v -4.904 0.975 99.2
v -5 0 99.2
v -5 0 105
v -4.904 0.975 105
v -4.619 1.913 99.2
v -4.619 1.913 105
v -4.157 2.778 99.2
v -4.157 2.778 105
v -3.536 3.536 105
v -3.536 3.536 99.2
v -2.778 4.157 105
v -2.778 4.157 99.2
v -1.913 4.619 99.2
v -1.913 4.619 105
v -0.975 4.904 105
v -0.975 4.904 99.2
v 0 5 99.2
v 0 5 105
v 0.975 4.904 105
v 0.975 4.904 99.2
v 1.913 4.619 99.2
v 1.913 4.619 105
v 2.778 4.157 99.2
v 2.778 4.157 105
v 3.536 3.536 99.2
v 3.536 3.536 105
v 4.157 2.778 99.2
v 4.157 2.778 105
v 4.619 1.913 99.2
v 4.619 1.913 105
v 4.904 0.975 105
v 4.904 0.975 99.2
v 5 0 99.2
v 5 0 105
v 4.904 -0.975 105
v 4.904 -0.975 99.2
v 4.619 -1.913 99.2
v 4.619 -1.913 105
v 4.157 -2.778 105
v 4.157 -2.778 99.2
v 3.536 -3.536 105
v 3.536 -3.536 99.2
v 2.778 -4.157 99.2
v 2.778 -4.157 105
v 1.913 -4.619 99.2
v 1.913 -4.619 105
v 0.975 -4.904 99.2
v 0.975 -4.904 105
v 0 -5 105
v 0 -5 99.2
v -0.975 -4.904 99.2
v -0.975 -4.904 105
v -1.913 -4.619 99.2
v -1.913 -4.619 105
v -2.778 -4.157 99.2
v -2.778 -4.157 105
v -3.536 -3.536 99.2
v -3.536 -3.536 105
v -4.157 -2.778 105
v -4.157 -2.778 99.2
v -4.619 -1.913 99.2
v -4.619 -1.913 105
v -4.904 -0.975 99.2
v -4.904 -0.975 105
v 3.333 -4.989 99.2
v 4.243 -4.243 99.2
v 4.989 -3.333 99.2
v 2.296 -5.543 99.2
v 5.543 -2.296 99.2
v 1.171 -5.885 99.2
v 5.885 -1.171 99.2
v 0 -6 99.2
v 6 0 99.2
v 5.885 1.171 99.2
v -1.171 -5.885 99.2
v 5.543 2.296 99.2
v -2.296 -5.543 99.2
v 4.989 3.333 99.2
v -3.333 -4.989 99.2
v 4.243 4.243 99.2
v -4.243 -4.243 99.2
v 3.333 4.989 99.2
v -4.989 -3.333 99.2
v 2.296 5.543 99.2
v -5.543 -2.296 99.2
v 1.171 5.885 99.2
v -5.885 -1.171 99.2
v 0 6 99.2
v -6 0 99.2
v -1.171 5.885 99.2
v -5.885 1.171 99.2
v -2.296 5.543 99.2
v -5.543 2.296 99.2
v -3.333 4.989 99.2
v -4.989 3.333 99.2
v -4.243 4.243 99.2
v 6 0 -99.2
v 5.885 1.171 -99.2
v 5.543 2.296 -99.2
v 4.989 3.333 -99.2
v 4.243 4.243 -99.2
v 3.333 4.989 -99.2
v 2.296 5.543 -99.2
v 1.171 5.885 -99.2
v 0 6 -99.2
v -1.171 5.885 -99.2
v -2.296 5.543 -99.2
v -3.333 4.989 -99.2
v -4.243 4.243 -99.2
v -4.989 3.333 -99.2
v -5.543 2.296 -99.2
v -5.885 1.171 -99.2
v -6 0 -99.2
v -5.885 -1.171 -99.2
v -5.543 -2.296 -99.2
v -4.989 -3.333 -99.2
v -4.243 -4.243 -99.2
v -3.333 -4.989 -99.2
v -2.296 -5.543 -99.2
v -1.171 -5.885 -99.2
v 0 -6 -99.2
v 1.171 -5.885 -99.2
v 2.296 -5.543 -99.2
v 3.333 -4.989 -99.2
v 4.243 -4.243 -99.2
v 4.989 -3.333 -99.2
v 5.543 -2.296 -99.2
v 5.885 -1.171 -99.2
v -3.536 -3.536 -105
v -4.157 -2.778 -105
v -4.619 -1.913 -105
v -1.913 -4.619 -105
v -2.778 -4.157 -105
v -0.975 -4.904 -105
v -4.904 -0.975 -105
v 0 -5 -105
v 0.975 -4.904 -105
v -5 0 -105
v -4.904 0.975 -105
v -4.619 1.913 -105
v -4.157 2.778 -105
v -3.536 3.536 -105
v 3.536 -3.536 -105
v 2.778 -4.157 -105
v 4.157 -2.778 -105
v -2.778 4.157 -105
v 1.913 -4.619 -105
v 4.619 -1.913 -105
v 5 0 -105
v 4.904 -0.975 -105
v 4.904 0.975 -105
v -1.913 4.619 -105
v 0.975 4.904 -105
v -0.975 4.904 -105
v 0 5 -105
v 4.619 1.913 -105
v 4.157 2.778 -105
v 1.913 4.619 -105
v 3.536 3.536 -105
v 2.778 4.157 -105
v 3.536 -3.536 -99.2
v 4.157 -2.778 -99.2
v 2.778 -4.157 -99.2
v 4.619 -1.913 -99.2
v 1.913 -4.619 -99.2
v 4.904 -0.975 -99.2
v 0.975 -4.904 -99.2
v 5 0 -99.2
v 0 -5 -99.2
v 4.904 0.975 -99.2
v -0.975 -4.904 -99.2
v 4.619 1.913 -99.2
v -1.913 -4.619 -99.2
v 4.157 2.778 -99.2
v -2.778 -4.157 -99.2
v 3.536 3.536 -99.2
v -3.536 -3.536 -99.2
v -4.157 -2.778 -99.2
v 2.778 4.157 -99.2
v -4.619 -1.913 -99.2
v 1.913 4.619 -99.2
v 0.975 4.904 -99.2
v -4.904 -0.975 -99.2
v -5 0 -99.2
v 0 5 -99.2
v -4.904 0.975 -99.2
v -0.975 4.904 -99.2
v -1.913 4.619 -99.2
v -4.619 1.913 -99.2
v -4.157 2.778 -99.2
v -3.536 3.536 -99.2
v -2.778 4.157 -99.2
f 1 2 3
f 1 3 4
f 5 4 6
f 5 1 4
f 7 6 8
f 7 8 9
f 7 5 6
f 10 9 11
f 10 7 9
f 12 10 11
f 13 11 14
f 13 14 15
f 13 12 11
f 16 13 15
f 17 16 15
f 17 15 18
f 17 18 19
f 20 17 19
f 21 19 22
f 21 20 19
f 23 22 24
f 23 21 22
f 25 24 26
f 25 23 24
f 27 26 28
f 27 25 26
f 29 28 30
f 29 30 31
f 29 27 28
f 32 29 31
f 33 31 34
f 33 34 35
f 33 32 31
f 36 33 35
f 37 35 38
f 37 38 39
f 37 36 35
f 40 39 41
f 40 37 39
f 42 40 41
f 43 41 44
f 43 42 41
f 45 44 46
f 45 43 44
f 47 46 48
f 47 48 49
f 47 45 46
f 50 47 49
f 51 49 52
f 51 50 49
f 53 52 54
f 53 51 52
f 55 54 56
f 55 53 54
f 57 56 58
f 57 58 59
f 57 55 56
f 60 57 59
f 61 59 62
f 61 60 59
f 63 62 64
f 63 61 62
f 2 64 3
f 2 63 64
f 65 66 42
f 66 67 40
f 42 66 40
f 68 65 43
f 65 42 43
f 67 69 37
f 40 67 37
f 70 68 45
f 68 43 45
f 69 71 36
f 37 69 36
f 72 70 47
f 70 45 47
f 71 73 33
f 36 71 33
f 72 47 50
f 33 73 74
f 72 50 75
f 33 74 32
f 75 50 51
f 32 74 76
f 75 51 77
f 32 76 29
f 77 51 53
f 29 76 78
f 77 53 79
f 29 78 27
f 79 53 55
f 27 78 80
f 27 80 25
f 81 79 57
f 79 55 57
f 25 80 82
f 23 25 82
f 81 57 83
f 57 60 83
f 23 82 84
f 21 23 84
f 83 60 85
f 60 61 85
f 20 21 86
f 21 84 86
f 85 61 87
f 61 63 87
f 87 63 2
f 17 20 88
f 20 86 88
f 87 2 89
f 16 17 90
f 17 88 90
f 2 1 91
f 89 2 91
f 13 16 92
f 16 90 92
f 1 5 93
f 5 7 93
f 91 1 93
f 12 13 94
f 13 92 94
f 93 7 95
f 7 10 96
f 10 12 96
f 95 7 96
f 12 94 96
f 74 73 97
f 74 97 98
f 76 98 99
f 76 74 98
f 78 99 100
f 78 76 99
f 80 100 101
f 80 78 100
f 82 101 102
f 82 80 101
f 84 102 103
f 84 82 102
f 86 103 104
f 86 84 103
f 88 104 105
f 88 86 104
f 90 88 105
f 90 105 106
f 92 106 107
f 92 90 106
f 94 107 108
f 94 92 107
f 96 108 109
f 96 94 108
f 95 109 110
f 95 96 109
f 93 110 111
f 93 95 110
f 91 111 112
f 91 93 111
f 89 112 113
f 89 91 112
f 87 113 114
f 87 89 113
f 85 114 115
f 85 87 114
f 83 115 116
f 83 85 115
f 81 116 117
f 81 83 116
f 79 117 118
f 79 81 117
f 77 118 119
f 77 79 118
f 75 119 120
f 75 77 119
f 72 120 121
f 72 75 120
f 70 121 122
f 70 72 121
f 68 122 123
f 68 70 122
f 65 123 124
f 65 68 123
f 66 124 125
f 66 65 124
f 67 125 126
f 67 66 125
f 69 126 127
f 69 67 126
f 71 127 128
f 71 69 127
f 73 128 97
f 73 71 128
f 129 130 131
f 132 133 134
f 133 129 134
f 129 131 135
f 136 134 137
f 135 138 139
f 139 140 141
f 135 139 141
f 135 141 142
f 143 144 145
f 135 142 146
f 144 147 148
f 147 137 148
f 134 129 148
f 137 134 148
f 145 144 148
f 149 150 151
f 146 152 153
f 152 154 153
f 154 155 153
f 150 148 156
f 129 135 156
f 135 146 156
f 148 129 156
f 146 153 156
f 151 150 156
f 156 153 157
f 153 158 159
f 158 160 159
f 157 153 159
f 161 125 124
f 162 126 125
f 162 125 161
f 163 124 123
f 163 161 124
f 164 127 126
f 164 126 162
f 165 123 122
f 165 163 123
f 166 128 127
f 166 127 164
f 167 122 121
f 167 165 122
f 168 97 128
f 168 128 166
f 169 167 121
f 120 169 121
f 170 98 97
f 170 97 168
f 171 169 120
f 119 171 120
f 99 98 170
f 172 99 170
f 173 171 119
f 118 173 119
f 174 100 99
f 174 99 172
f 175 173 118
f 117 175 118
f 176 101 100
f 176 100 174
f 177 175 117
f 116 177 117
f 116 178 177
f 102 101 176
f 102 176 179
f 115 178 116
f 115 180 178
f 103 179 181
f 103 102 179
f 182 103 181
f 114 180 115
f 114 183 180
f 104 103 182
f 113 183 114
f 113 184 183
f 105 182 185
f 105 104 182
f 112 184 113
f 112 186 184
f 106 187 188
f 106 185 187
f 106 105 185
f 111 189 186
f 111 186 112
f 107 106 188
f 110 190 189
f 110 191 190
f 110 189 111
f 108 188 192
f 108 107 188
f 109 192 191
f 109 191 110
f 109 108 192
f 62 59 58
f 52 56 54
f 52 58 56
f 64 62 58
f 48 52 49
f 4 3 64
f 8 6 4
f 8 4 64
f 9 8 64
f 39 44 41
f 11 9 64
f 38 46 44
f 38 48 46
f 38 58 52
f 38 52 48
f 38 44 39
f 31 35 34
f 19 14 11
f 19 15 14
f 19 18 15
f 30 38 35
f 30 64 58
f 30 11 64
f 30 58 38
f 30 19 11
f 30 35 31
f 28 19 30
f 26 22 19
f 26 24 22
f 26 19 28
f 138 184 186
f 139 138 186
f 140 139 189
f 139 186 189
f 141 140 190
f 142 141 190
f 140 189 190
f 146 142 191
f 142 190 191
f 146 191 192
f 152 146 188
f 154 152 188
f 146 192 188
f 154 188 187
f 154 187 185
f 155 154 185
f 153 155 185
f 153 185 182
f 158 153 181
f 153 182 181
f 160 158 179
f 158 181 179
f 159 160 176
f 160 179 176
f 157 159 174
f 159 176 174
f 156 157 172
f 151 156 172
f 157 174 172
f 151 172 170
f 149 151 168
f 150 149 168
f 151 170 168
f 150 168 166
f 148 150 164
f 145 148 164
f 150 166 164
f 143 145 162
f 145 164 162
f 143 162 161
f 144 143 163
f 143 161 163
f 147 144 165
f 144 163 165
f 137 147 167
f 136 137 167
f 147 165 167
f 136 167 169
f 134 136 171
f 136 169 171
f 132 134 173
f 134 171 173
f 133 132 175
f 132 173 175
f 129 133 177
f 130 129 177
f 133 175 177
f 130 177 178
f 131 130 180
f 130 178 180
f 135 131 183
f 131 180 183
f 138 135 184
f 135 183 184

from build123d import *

# Parameters (mm, degrees)
SKETCH_1_R          = 6
EXTRUDE_1_DEPTH     = 105
CUT_EXTRUDE_START   = -5.8
SKETCH_2_R          = 6
SKETCH_2_R_2        = 5
CUT_EXTRUDE_1_DEPTH = 5.8


with BuildPart() as part:
    # ｽｹｯﾁ1 → ﾎﾞｽ - 押し出し1 (new, symmetric)
    with BuildSketch(Plane.XY):
        Circle(SKETCH_1_R)
    extrude(amount=EXTRUDE_1_DEPTH, both=True)

    # ｽｹｯﾁ2 → ｶｯﾄ - 押し出し1 (cut)
    with BuildSketch(Plane(origin=(0, 0, -105), x_dir=(-1, 0, 0), z_dir=(0, 0, -1)).offset(CUT_EXTRUDE_START)):
        Circle(SKETCH_2_R)
        Circle(SKETCH_2_R_2, mode=Mode.SUBTRACT)
    cut_extrude_1 = extrude(amount=CUT_EXTRUDE_1_DEPTH, mode=Mode.SUBTRACT)

    # ﾐﾗｰ1: ｶｯﾄ - 押し出し1 across plane
    add(cut_extrude_1.mirror(Plane.XY), mode=Mode.SUBTRACT)


solid = part.part
